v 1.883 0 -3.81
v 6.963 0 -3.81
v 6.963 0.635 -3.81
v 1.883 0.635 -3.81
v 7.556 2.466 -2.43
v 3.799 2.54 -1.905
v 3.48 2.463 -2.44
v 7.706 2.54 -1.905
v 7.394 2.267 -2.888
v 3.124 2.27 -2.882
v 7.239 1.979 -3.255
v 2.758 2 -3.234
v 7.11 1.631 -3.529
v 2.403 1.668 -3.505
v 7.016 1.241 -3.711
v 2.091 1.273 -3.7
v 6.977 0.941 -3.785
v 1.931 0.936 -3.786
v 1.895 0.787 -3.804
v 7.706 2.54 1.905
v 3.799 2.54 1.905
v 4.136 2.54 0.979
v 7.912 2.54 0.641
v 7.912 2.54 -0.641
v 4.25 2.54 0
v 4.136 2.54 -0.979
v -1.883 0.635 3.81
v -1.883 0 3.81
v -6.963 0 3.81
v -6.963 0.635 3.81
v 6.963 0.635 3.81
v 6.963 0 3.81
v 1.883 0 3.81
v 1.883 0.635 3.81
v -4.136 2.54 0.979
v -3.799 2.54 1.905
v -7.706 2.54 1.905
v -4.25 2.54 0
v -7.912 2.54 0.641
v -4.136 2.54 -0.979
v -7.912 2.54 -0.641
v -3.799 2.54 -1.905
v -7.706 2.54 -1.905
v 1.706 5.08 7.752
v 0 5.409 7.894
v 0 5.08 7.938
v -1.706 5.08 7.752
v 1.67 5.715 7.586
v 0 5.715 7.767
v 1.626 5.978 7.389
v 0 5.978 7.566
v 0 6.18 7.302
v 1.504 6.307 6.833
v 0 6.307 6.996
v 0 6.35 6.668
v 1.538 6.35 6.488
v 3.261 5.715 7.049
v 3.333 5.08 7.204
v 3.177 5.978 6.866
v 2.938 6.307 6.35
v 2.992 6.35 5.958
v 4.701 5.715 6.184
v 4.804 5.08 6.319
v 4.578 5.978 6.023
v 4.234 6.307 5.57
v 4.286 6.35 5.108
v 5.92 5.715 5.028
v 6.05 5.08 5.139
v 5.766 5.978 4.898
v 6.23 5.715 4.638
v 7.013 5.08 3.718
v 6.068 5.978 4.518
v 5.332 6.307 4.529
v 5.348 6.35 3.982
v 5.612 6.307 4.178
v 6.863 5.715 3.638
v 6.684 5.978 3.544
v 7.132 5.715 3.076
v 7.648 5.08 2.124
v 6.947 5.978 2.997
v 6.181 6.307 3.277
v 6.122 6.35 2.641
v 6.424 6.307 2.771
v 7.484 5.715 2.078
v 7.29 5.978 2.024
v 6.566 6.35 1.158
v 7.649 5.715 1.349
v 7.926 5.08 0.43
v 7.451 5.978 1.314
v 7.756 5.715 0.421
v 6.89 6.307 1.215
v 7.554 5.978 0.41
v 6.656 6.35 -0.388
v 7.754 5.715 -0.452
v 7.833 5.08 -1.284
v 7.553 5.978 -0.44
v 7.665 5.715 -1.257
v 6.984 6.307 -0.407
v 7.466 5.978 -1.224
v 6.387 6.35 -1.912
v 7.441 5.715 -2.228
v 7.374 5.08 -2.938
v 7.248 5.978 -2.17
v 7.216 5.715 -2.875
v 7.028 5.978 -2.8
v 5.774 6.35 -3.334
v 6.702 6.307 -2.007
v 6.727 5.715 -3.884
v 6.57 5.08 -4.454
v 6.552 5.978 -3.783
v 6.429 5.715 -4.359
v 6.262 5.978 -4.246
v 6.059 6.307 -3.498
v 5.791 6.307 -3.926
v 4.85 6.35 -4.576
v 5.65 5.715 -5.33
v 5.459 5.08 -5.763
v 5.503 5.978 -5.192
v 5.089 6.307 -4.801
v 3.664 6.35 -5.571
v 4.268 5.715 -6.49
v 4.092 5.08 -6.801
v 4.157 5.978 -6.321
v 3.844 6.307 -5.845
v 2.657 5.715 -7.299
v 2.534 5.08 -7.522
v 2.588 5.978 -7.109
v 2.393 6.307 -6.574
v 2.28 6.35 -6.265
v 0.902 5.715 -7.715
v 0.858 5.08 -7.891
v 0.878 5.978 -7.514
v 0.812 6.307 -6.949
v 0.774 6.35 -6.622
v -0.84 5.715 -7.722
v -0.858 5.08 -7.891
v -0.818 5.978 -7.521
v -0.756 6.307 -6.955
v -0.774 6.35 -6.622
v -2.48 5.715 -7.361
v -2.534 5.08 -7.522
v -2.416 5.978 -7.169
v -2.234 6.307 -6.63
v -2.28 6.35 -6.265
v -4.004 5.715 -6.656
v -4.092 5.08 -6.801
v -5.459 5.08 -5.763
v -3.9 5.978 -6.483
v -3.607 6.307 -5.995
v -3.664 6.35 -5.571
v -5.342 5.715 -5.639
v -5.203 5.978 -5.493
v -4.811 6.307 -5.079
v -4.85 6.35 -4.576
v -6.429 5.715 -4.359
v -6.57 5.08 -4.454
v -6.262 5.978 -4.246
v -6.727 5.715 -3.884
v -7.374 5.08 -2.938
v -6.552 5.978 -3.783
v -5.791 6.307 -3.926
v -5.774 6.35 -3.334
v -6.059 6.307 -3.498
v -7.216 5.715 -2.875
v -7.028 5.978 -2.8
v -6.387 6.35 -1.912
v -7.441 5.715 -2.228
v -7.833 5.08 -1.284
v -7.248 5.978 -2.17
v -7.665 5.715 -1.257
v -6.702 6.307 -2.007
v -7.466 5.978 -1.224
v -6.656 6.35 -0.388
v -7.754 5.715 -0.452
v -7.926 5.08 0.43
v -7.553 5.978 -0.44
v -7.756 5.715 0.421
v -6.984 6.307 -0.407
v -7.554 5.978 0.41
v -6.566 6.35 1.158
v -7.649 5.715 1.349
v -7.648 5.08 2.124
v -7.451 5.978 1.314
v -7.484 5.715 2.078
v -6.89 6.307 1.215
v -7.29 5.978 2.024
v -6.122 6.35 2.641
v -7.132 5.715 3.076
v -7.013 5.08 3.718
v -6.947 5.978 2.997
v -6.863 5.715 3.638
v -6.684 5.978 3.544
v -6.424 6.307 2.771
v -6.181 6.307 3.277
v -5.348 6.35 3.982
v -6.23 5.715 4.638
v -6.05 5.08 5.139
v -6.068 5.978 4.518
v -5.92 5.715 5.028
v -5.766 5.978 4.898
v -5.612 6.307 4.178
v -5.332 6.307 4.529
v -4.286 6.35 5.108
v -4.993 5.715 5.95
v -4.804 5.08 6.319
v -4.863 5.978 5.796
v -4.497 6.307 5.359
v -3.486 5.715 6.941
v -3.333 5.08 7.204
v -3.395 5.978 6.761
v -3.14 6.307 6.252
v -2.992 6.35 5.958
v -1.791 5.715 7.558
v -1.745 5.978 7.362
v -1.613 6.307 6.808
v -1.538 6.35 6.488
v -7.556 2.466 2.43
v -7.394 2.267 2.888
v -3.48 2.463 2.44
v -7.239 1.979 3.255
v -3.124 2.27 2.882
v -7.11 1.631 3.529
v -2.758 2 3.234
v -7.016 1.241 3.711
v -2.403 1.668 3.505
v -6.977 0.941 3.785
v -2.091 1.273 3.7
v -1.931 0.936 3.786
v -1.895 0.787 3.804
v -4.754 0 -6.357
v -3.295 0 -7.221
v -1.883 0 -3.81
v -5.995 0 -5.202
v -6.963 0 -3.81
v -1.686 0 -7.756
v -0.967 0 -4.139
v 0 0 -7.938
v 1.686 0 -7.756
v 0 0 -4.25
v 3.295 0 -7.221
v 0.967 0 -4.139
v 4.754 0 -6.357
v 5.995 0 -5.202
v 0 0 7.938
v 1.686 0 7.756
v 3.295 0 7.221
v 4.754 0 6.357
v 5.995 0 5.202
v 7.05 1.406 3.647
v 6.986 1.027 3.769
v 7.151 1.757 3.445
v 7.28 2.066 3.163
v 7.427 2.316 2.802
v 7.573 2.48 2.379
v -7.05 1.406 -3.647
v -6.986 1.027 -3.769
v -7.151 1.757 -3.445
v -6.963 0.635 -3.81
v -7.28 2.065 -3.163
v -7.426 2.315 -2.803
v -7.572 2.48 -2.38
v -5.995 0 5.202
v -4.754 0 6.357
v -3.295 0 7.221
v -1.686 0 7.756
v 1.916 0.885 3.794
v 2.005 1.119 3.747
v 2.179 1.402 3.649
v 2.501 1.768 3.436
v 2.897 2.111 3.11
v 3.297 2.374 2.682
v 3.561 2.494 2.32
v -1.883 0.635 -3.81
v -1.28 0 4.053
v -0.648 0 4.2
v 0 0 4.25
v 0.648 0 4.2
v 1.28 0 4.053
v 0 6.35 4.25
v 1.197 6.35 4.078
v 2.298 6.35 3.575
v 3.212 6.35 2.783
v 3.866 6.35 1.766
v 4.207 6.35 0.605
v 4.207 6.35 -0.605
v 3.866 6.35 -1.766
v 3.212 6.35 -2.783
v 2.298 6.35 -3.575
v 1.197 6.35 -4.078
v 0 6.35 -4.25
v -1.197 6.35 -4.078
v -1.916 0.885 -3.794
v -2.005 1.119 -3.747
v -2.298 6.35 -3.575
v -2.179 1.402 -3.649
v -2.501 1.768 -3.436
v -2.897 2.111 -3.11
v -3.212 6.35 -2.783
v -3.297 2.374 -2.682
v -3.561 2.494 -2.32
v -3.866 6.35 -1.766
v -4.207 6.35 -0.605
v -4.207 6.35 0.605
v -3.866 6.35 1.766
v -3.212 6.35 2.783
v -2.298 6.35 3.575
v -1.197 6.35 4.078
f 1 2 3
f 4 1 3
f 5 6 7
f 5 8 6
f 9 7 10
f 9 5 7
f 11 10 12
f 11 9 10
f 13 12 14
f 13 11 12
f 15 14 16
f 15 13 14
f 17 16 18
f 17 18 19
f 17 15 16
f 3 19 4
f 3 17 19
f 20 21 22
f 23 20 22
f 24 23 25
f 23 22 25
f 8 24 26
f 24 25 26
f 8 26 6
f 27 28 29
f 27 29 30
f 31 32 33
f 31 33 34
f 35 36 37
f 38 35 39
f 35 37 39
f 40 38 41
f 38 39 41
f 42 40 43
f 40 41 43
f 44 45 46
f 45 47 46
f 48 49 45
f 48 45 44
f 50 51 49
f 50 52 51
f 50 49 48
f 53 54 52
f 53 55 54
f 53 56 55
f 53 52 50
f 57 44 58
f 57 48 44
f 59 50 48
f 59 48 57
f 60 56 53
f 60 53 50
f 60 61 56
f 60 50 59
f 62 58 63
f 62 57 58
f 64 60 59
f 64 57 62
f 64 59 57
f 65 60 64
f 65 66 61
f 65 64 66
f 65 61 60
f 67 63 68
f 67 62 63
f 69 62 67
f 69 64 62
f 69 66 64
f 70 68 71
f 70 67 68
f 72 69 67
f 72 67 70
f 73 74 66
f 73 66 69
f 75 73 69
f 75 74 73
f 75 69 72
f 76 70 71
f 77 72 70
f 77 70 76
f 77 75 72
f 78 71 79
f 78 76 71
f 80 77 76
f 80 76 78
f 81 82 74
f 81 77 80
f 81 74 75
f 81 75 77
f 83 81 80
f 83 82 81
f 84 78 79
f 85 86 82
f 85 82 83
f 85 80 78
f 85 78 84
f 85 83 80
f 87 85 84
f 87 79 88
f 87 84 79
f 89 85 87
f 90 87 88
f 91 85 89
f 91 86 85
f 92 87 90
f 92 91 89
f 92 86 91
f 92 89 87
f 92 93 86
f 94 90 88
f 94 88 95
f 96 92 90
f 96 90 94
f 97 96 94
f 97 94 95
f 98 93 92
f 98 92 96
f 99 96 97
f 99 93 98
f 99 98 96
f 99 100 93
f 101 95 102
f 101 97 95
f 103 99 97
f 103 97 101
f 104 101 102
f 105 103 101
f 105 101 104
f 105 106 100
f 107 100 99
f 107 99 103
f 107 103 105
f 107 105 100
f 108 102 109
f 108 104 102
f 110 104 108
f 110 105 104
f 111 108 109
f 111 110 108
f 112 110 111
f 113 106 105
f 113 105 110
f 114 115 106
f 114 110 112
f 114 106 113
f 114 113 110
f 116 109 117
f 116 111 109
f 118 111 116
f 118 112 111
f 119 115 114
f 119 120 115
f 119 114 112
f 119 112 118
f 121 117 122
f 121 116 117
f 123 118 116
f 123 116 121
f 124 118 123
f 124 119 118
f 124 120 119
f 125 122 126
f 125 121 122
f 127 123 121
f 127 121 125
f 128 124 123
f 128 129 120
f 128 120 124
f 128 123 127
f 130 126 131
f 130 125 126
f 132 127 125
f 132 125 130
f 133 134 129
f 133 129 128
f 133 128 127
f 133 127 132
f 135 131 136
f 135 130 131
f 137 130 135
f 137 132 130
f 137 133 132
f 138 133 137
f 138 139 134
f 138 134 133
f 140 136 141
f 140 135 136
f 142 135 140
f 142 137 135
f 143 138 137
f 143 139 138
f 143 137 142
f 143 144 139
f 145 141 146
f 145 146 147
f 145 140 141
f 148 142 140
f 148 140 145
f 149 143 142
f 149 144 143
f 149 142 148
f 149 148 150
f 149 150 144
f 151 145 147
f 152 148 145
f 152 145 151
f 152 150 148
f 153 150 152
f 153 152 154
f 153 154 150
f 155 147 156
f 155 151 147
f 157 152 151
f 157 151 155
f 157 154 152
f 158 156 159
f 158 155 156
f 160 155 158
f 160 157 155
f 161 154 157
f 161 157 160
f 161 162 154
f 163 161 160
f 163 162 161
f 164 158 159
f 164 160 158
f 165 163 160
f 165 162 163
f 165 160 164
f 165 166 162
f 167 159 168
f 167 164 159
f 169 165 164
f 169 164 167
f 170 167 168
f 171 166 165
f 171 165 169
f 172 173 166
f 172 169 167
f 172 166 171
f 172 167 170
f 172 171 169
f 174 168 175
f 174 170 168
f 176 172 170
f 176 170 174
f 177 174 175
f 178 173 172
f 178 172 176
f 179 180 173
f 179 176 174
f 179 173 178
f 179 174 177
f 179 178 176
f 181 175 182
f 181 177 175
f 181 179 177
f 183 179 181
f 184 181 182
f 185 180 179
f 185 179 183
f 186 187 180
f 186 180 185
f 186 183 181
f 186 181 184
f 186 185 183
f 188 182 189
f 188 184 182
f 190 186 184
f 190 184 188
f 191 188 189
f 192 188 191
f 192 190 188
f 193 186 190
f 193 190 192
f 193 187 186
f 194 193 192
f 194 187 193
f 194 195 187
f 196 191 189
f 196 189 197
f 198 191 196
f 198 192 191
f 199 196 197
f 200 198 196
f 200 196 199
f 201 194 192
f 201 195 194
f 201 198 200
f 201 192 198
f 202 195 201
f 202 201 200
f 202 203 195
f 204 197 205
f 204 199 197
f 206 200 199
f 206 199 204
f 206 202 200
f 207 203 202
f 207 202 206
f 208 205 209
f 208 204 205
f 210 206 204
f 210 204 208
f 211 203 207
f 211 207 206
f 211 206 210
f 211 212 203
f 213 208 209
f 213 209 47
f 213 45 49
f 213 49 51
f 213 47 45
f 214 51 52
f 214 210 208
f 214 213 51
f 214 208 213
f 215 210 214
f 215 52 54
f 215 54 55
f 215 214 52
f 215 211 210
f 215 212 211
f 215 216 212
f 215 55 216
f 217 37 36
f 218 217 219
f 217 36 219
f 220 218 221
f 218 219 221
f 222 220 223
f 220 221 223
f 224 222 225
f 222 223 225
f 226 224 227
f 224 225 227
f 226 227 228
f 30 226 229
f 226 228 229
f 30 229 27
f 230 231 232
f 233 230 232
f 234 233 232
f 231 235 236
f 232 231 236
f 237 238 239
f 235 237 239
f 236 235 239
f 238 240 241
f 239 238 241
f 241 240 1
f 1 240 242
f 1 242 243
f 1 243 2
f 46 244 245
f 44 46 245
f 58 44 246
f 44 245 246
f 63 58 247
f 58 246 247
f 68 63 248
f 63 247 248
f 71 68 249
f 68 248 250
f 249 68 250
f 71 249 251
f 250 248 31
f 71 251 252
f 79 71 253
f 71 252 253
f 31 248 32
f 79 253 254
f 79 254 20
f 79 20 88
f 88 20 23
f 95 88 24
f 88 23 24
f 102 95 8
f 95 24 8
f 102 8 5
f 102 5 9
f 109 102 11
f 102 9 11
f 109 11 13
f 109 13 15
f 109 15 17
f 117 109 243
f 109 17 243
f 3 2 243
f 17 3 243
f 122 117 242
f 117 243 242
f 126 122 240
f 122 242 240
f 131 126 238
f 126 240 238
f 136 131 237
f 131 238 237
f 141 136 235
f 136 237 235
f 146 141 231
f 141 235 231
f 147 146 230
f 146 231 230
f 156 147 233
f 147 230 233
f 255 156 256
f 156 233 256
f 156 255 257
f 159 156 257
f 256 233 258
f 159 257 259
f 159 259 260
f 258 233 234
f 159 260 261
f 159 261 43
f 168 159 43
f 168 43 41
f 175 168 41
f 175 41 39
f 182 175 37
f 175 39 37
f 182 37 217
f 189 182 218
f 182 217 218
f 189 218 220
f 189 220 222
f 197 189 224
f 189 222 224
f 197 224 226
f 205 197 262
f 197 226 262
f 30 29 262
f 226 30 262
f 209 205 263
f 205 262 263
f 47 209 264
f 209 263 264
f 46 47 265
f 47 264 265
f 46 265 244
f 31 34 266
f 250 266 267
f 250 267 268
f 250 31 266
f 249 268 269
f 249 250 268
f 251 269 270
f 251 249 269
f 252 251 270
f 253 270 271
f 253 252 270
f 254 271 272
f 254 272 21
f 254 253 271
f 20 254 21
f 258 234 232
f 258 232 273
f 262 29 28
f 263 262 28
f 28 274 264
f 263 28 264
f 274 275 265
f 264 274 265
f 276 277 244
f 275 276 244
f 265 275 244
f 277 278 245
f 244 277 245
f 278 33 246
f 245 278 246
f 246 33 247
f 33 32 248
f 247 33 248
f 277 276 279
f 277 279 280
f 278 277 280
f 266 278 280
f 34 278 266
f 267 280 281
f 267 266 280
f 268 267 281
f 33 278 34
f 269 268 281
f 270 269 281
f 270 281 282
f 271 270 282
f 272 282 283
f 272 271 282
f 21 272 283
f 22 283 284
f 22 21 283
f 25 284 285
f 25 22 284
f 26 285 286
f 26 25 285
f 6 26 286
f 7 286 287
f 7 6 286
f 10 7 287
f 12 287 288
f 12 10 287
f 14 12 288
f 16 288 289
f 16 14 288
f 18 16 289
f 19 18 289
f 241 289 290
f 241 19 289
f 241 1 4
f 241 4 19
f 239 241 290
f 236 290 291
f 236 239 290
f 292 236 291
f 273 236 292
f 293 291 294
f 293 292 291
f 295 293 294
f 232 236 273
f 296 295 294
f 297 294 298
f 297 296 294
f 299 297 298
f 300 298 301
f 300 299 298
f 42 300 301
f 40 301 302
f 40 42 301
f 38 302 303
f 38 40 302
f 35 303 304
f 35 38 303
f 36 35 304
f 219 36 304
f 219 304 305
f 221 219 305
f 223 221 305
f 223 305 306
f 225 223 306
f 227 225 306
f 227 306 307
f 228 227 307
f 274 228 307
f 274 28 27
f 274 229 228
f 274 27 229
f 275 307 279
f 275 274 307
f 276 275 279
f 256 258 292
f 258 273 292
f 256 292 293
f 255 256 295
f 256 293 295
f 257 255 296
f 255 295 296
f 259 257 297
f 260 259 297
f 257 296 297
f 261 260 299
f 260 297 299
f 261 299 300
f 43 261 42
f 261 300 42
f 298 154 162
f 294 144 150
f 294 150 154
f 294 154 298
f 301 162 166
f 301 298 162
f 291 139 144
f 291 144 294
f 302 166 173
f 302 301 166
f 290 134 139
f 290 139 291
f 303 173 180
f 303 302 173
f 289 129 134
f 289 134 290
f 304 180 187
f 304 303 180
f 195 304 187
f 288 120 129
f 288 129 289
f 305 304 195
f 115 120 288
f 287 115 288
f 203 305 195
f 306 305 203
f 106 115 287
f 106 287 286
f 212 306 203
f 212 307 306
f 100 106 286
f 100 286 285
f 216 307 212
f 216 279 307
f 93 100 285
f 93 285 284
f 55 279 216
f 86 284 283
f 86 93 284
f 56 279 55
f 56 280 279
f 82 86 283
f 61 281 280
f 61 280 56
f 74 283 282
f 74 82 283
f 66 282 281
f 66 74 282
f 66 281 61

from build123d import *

# Parameters (mm, degrees)
SKETCH1_R               = 7.9375
SKETCH1_R_2             = 4.25
BOSS_EXTRUDE1_DEPTH     = 6.35
CUT_EXTRUDE1_DEPTH      = 13.896910967
CUT_EXTRUDE1_DEPTH_BACK = 13.896910967
SKETCH2_W               = 7.62
SKETCH2_H               = 2.54
FILLET2_R               = 1.905
FILLET3_R               = 1.27


with BuildPart() as part:
    # Sketch1 → Boss-Extrude1 (new body)
    with BuildSketch(Plane(origin=(0, 0, 0), x_dir=(1, 0, 0), z_dir=(0, 1, 0))):
        with Locations(Location((0, 0, 0), (0, 0, 270))):
            Circle(SKETCH1_R)
        with Locations(Location((0, 0, 0), (0, 0, 270))):
            Circle(SKETCH1_R_2, mode=Mode.SUBTRACT)
    extrude(amount=BOSS_EXTRUDE1_DEPTH)

    # Sketch2 → Cut-Extrude1 (cut, two sides: drawn at the far end of the back side and taken through both)
    with BuildSketch(Plane(origin=(0, 0, 0), x_dir=(0, 0, -1), z_dir=(1, 0, 0)).offset(-CUT_EXTRUDE1_DEPTH_BACK)):
        with Locations((0, 1.27)):
            Rectangle(SKETCH2_W, SKETCH2_H)
    extrude(amount=CUT_EXTRUDE1_DEPTH + CUT_EXTRUDE1_DEPTH_BACK, mode=Mode.SUBTRACT)

    # Fillet2
    fillet2_edges = [part.edges().sort_by_distance(p)[0] for p in [
        (4.423253704, 2.54, 3.81),
        (-4.423253704, 2.54, 3.81),
        (4.423253704, 2.54, -3.81),
        (-4.423253704, 2.54, -3.81),
    ]]
    fillet(fillet2_edges, radius=FILLET2_R)

    # Fillet3
    fillet3_edges = [part.edges().sort_by_distance(p)[0] for p in [
        (0, 6.35, -7.9375),
    ]]
    fillet(fillet3_edges, radius=FILLET3_R)


solid = part.part
